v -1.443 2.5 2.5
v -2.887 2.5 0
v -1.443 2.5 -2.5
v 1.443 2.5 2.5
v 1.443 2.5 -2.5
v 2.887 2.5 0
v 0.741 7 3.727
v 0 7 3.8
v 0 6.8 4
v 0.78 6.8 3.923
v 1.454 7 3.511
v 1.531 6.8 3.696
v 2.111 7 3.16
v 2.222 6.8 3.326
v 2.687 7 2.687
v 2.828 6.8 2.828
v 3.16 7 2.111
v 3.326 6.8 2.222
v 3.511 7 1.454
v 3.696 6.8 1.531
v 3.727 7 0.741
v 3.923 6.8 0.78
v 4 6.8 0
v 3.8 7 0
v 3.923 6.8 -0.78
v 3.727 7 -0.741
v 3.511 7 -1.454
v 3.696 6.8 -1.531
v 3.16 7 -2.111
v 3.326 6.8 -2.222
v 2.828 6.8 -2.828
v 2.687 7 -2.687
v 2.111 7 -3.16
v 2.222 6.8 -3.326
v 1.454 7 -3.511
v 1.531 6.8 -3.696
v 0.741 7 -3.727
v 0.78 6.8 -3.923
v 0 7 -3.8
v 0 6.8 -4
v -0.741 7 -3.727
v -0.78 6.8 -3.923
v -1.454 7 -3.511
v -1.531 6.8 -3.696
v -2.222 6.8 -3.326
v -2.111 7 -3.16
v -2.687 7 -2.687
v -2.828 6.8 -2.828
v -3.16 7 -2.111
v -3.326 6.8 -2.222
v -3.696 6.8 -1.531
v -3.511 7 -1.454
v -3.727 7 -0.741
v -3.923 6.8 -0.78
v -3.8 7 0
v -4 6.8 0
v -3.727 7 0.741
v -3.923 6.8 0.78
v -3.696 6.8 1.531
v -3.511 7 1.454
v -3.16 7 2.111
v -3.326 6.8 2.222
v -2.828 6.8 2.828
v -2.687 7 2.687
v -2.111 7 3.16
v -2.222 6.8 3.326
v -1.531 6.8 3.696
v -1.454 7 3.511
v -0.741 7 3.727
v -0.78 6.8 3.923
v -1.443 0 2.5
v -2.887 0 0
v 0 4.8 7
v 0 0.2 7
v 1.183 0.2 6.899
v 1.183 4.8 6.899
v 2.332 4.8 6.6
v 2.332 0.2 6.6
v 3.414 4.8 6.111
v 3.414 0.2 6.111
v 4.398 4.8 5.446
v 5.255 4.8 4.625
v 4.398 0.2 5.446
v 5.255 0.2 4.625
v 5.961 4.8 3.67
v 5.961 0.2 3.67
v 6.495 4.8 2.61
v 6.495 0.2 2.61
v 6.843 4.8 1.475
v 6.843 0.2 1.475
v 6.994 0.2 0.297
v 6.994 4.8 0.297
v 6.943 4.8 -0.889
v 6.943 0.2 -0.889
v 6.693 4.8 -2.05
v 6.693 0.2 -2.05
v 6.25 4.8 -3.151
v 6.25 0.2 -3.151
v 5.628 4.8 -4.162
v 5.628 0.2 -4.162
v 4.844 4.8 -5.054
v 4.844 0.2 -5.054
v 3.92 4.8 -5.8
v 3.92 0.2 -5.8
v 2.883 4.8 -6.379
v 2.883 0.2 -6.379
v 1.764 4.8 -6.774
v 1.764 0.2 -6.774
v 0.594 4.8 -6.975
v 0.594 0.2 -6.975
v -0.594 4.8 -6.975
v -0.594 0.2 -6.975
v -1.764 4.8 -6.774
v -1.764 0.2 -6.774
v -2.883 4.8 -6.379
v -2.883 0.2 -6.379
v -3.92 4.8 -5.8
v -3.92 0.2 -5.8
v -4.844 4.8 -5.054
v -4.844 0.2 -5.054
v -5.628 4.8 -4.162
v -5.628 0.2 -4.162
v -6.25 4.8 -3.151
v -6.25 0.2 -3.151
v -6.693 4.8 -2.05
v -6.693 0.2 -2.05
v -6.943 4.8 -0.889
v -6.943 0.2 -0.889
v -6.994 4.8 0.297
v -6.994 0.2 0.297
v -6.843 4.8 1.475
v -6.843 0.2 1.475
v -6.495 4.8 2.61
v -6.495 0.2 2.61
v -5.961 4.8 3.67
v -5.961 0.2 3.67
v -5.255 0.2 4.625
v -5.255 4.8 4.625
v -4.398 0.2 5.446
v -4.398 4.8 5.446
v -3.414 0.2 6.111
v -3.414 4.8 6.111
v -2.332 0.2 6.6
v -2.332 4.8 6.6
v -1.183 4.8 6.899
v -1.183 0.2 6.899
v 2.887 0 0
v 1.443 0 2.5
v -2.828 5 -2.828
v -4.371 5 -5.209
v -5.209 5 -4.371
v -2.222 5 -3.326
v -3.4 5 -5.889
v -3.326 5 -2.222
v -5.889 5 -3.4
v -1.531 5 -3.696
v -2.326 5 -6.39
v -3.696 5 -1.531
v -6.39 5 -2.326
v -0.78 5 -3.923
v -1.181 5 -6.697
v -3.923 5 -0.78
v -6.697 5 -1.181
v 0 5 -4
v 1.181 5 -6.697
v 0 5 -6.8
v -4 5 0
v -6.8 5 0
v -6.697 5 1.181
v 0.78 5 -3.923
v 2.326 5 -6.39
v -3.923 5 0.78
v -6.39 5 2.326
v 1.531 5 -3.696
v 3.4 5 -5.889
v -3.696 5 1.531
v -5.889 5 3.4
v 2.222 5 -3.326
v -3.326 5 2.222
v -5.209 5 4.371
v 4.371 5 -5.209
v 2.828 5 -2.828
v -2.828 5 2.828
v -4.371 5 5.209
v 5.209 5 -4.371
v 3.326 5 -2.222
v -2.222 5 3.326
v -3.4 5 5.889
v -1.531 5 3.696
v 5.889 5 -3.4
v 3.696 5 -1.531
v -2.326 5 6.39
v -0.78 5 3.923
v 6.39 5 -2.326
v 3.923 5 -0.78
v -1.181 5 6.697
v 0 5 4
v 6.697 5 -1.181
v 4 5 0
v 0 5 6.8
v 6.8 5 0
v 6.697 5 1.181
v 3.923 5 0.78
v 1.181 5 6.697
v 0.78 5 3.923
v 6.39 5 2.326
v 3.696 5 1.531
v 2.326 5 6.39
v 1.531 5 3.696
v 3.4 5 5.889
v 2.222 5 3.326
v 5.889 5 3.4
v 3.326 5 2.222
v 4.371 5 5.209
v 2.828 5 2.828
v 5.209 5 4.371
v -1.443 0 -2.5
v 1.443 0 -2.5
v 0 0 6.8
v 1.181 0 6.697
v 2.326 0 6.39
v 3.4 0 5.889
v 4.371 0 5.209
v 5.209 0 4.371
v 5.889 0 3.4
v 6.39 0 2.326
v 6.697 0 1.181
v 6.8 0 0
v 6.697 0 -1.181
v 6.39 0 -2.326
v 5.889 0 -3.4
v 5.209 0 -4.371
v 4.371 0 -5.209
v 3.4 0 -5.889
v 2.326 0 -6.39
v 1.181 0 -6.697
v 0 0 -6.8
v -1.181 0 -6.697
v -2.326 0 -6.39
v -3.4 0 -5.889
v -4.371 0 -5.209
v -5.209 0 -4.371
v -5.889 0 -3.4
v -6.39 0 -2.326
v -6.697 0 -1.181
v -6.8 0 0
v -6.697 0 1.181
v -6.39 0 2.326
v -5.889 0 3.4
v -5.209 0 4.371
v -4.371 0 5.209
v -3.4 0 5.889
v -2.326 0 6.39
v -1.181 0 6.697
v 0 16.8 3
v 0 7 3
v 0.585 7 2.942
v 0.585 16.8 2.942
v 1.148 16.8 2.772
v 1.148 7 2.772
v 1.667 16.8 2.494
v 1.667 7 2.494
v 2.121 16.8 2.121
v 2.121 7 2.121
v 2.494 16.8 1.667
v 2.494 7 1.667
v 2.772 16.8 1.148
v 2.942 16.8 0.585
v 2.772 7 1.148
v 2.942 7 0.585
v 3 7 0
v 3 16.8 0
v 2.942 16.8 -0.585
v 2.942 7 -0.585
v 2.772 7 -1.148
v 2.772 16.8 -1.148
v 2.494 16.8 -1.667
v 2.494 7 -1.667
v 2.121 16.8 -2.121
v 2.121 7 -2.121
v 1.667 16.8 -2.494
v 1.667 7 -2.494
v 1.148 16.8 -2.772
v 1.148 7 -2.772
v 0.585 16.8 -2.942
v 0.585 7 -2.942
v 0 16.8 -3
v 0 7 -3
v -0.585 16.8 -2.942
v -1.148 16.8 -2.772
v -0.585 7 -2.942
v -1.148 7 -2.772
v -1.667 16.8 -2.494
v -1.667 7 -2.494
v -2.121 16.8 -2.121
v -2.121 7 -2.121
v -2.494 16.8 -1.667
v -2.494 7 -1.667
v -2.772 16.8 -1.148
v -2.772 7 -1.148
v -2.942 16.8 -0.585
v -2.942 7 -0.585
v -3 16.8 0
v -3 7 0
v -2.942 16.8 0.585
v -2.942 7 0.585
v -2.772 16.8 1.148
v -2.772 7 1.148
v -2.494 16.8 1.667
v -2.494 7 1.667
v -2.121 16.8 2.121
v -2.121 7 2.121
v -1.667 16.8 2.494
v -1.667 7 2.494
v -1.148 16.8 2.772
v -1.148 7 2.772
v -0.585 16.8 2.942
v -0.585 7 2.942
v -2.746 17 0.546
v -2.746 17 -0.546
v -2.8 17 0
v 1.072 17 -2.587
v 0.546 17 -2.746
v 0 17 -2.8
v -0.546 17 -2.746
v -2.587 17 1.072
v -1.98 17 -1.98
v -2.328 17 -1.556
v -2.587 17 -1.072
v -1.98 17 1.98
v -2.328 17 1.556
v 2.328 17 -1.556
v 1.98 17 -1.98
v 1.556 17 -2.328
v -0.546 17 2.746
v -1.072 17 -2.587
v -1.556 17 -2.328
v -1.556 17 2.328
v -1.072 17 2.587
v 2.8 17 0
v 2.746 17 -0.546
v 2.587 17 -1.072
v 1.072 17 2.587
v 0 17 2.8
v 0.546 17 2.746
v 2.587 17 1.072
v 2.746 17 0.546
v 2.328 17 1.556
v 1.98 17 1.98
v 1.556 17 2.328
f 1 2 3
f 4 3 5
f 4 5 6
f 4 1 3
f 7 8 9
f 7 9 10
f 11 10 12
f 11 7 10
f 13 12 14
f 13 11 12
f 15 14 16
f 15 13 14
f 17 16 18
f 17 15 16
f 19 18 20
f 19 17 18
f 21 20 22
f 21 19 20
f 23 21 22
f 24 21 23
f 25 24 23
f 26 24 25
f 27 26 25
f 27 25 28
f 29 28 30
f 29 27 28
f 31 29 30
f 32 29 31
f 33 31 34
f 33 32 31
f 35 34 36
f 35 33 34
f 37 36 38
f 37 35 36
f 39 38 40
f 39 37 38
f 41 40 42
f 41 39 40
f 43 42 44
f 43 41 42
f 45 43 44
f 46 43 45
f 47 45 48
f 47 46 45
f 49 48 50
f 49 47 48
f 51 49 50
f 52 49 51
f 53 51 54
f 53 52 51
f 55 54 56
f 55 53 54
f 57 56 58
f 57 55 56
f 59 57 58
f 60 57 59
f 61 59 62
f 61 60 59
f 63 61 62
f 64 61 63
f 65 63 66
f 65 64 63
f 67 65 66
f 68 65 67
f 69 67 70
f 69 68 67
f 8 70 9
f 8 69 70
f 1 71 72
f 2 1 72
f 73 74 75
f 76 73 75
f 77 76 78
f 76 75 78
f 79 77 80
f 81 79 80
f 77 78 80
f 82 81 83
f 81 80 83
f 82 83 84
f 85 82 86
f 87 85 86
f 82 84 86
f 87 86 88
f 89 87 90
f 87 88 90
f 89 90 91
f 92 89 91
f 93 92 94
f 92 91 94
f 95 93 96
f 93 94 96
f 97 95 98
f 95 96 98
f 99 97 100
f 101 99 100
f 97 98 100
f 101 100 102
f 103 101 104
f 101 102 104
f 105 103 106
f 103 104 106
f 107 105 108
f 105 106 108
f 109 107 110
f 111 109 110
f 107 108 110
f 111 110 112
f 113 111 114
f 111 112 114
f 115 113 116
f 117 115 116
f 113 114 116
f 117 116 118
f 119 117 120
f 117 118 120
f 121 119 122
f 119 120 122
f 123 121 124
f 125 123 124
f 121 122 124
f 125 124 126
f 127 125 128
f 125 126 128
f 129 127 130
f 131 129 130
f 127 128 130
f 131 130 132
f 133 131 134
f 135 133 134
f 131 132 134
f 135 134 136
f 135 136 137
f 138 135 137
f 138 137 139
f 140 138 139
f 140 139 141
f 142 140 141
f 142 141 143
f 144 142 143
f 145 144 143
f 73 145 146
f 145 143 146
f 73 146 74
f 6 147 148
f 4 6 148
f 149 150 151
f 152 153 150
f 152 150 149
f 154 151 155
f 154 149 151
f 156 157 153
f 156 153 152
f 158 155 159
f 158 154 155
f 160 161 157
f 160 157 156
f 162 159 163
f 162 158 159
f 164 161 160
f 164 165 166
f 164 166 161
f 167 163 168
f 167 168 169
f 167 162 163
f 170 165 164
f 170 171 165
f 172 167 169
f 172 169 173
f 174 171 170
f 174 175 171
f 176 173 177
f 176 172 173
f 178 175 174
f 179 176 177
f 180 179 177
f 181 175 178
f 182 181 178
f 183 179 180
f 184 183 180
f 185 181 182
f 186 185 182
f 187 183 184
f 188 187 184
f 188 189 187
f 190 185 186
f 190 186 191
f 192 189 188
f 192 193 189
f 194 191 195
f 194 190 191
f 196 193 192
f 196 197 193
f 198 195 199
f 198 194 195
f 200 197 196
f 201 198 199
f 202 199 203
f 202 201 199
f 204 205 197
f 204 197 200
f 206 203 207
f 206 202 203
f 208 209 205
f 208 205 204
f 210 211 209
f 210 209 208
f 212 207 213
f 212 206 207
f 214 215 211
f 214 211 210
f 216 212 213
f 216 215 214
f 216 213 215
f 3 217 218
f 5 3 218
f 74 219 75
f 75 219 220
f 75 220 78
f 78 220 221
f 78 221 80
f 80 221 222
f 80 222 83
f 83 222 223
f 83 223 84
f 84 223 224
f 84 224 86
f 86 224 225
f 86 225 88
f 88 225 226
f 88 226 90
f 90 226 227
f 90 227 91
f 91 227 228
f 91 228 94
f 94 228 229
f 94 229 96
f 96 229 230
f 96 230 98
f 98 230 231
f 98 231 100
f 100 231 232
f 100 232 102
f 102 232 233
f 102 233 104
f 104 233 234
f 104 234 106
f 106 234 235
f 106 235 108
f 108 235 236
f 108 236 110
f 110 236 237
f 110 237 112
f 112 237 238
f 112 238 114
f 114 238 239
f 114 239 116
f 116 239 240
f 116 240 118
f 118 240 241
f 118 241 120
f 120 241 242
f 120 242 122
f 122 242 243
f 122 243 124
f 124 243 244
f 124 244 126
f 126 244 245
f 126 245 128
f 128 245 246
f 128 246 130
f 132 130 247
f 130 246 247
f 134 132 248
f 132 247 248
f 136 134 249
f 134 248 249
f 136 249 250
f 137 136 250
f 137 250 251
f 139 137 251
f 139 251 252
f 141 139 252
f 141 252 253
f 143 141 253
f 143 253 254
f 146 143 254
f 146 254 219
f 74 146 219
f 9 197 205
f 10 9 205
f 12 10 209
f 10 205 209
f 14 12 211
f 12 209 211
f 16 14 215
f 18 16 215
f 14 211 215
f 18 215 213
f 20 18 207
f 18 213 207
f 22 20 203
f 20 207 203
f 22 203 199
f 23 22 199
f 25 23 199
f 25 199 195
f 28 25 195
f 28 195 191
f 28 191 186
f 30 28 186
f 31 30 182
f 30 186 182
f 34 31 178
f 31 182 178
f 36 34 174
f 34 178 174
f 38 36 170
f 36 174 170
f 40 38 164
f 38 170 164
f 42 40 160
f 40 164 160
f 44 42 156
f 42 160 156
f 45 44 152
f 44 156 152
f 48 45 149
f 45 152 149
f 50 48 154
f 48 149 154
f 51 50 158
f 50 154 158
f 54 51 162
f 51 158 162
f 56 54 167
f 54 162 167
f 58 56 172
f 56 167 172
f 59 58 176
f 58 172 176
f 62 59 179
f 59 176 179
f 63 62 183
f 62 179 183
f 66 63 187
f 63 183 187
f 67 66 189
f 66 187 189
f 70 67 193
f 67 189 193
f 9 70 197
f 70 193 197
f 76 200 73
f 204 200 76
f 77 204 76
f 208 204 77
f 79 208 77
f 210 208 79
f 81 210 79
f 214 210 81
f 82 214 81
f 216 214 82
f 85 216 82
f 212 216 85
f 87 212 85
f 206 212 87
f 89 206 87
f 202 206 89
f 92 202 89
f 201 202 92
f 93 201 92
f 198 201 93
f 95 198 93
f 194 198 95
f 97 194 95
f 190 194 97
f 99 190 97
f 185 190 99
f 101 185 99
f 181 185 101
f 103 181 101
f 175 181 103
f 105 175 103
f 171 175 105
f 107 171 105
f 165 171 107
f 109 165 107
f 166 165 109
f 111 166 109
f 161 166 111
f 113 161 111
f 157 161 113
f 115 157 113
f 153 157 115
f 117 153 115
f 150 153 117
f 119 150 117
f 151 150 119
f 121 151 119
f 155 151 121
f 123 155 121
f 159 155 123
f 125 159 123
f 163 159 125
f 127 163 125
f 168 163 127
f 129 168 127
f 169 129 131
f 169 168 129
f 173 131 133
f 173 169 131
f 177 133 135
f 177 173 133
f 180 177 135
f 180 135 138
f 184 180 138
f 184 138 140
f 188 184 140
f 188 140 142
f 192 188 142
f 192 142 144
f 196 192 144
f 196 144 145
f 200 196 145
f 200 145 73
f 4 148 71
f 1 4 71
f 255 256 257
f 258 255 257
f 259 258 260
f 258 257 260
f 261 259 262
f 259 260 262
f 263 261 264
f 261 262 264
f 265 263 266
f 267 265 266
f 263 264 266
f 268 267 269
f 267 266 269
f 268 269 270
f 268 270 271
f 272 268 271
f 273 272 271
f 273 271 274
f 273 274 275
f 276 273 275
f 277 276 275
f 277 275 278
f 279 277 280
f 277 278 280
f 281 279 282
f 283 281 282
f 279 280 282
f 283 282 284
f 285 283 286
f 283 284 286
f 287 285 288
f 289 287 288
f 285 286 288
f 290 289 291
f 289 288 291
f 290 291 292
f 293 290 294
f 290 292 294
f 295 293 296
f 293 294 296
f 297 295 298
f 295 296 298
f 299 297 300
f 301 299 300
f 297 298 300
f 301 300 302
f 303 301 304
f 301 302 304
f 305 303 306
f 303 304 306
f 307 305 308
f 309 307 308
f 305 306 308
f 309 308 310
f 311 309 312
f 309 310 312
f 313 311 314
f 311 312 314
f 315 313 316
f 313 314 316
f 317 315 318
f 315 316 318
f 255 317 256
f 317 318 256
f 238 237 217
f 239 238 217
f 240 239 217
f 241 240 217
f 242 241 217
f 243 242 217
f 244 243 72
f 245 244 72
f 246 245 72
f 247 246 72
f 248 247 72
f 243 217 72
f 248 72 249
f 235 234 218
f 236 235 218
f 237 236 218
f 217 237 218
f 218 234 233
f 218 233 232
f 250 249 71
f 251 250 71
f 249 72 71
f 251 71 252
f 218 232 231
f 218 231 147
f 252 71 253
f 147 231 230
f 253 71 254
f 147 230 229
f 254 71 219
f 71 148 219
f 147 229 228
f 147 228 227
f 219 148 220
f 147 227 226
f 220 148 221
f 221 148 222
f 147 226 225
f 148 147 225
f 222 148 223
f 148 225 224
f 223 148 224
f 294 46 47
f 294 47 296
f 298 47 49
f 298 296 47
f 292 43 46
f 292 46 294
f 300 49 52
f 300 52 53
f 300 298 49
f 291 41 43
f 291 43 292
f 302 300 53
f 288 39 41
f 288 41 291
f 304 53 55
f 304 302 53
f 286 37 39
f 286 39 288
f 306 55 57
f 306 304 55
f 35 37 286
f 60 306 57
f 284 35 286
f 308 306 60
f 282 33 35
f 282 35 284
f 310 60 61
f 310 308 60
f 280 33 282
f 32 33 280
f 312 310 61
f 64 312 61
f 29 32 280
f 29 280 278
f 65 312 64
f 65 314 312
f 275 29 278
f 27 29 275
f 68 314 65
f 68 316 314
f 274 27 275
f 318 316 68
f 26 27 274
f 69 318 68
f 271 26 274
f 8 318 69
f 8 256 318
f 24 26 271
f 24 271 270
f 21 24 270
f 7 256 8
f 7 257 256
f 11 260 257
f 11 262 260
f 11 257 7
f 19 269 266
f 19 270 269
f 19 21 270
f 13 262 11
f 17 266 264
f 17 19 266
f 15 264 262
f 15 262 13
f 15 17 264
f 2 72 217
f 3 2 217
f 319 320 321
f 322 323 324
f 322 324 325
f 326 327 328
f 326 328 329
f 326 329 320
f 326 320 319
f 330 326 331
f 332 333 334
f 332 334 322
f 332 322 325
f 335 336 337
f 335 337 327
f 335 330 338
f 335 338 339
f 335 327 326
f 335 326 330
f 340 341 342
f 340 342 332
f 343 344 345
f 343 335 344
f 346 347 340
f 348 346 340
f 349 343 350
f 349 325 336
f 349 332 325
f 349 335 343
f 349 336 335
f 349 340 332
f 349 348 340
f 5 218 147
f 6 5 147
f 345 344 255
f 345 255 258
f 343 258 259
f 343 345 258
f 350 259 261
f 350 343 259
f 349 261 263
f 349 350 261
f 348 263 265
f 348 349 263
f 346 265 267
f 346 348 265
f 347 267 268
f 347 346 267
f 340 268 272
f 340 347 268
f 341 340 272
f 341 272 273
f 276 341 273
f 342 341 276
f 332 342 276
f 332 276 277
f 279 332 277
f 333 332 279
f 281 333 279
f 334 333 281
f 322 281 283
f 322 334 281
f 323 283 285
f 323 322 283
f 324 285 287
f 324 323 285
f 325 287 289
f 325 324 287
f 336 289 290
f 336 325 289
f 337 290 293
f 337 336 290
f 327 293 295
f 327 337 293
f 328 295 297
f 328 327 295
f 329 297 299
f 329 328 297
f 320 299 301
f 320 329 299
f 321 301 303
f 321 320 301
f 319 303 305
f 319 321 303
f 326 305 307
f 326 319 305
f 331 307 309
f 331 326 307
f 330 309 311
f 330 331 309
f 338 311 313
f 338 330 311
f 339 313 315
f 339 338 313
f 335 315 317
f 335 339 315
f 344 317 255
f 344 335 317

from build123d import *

# Parameters (mm, degrees)
SKETCH_1_R          = 7
EXTRUDE_1_DEPTH     = 5
SKETCH_2_R          = 4
EXTRUDE_2_DEPTH     = 2
SKETCH_3_R          = 3
EXTRUDE_3_DEPTH     = 10
CHAMFER_1_SIZE      = 0.2
CUT_EXTRUDE_1_DEPTH = 2.5


with BuildPart() as part:
    # 草图1 → 凸台-拉伸1 (new body)
    with BuildSketch(Plane(origin=(0, 0, 0), x_dir=(1, 0, 0), z_dir=(0, 1, 0))):
        with Locations(Location((0, 0, 0), (0, 0, 270))):
            Circle(SKETCH_1_R)
    extrude(amount=EXTRUDE_1_DEPTH)

    # 草图2 → 凸台-拉伸2 (add)
    with BuildSketch(Plane(origin=(0, 5, 0), x_dir=(1, 0, 0), z_dir=(0, 1, 0))):
        with Locations(Location((0, 0, 0), (0, 0, 270))):
            Circle(SKETCH_2_R)
    extrude(amount=EXTRUDE_2_DEPTH)

    # 草图3 → 凸台-拉伸3 (add)
    with BuildSketch(Plane(origin=(0, 7, 0), x_dir=(1, 0, 0), z_dir=(0, 1, 0))):
        with Locations(Location((0, 0, 0), (0, 0, 270))):
            Circle(SKETCH_3_R)
    extrude(amount=EXTRUDE_3_DEPTH)

    # 倒角1
    chamfer_1_edges = [part.edges().sort_by_distance(p)[0] for p in [
        (0, 17, -3),
        (0, 0, -7),
        (0, 5, -7),
        (0, 7, -4),
    ]]
    chamfer(chamfer_1_edges, length=CHAMFER_1_SIZE)

    # 草图4 → 切除-拉伸1 (cut)
    with BuildSketch(Plane.XZ):
        Polygon((2.886751346, 0), (1.443375673, 2.5), (-1.443375673, 2.5), (-2.886751346, 0), (-1.443375673, -2.5), (1.443375673, -2.5), align=None)
    extrude(amount=-CUT_EXTRUDE_1_DEPTH, mode=Mode.SUBTRACT)


solid = part.part
